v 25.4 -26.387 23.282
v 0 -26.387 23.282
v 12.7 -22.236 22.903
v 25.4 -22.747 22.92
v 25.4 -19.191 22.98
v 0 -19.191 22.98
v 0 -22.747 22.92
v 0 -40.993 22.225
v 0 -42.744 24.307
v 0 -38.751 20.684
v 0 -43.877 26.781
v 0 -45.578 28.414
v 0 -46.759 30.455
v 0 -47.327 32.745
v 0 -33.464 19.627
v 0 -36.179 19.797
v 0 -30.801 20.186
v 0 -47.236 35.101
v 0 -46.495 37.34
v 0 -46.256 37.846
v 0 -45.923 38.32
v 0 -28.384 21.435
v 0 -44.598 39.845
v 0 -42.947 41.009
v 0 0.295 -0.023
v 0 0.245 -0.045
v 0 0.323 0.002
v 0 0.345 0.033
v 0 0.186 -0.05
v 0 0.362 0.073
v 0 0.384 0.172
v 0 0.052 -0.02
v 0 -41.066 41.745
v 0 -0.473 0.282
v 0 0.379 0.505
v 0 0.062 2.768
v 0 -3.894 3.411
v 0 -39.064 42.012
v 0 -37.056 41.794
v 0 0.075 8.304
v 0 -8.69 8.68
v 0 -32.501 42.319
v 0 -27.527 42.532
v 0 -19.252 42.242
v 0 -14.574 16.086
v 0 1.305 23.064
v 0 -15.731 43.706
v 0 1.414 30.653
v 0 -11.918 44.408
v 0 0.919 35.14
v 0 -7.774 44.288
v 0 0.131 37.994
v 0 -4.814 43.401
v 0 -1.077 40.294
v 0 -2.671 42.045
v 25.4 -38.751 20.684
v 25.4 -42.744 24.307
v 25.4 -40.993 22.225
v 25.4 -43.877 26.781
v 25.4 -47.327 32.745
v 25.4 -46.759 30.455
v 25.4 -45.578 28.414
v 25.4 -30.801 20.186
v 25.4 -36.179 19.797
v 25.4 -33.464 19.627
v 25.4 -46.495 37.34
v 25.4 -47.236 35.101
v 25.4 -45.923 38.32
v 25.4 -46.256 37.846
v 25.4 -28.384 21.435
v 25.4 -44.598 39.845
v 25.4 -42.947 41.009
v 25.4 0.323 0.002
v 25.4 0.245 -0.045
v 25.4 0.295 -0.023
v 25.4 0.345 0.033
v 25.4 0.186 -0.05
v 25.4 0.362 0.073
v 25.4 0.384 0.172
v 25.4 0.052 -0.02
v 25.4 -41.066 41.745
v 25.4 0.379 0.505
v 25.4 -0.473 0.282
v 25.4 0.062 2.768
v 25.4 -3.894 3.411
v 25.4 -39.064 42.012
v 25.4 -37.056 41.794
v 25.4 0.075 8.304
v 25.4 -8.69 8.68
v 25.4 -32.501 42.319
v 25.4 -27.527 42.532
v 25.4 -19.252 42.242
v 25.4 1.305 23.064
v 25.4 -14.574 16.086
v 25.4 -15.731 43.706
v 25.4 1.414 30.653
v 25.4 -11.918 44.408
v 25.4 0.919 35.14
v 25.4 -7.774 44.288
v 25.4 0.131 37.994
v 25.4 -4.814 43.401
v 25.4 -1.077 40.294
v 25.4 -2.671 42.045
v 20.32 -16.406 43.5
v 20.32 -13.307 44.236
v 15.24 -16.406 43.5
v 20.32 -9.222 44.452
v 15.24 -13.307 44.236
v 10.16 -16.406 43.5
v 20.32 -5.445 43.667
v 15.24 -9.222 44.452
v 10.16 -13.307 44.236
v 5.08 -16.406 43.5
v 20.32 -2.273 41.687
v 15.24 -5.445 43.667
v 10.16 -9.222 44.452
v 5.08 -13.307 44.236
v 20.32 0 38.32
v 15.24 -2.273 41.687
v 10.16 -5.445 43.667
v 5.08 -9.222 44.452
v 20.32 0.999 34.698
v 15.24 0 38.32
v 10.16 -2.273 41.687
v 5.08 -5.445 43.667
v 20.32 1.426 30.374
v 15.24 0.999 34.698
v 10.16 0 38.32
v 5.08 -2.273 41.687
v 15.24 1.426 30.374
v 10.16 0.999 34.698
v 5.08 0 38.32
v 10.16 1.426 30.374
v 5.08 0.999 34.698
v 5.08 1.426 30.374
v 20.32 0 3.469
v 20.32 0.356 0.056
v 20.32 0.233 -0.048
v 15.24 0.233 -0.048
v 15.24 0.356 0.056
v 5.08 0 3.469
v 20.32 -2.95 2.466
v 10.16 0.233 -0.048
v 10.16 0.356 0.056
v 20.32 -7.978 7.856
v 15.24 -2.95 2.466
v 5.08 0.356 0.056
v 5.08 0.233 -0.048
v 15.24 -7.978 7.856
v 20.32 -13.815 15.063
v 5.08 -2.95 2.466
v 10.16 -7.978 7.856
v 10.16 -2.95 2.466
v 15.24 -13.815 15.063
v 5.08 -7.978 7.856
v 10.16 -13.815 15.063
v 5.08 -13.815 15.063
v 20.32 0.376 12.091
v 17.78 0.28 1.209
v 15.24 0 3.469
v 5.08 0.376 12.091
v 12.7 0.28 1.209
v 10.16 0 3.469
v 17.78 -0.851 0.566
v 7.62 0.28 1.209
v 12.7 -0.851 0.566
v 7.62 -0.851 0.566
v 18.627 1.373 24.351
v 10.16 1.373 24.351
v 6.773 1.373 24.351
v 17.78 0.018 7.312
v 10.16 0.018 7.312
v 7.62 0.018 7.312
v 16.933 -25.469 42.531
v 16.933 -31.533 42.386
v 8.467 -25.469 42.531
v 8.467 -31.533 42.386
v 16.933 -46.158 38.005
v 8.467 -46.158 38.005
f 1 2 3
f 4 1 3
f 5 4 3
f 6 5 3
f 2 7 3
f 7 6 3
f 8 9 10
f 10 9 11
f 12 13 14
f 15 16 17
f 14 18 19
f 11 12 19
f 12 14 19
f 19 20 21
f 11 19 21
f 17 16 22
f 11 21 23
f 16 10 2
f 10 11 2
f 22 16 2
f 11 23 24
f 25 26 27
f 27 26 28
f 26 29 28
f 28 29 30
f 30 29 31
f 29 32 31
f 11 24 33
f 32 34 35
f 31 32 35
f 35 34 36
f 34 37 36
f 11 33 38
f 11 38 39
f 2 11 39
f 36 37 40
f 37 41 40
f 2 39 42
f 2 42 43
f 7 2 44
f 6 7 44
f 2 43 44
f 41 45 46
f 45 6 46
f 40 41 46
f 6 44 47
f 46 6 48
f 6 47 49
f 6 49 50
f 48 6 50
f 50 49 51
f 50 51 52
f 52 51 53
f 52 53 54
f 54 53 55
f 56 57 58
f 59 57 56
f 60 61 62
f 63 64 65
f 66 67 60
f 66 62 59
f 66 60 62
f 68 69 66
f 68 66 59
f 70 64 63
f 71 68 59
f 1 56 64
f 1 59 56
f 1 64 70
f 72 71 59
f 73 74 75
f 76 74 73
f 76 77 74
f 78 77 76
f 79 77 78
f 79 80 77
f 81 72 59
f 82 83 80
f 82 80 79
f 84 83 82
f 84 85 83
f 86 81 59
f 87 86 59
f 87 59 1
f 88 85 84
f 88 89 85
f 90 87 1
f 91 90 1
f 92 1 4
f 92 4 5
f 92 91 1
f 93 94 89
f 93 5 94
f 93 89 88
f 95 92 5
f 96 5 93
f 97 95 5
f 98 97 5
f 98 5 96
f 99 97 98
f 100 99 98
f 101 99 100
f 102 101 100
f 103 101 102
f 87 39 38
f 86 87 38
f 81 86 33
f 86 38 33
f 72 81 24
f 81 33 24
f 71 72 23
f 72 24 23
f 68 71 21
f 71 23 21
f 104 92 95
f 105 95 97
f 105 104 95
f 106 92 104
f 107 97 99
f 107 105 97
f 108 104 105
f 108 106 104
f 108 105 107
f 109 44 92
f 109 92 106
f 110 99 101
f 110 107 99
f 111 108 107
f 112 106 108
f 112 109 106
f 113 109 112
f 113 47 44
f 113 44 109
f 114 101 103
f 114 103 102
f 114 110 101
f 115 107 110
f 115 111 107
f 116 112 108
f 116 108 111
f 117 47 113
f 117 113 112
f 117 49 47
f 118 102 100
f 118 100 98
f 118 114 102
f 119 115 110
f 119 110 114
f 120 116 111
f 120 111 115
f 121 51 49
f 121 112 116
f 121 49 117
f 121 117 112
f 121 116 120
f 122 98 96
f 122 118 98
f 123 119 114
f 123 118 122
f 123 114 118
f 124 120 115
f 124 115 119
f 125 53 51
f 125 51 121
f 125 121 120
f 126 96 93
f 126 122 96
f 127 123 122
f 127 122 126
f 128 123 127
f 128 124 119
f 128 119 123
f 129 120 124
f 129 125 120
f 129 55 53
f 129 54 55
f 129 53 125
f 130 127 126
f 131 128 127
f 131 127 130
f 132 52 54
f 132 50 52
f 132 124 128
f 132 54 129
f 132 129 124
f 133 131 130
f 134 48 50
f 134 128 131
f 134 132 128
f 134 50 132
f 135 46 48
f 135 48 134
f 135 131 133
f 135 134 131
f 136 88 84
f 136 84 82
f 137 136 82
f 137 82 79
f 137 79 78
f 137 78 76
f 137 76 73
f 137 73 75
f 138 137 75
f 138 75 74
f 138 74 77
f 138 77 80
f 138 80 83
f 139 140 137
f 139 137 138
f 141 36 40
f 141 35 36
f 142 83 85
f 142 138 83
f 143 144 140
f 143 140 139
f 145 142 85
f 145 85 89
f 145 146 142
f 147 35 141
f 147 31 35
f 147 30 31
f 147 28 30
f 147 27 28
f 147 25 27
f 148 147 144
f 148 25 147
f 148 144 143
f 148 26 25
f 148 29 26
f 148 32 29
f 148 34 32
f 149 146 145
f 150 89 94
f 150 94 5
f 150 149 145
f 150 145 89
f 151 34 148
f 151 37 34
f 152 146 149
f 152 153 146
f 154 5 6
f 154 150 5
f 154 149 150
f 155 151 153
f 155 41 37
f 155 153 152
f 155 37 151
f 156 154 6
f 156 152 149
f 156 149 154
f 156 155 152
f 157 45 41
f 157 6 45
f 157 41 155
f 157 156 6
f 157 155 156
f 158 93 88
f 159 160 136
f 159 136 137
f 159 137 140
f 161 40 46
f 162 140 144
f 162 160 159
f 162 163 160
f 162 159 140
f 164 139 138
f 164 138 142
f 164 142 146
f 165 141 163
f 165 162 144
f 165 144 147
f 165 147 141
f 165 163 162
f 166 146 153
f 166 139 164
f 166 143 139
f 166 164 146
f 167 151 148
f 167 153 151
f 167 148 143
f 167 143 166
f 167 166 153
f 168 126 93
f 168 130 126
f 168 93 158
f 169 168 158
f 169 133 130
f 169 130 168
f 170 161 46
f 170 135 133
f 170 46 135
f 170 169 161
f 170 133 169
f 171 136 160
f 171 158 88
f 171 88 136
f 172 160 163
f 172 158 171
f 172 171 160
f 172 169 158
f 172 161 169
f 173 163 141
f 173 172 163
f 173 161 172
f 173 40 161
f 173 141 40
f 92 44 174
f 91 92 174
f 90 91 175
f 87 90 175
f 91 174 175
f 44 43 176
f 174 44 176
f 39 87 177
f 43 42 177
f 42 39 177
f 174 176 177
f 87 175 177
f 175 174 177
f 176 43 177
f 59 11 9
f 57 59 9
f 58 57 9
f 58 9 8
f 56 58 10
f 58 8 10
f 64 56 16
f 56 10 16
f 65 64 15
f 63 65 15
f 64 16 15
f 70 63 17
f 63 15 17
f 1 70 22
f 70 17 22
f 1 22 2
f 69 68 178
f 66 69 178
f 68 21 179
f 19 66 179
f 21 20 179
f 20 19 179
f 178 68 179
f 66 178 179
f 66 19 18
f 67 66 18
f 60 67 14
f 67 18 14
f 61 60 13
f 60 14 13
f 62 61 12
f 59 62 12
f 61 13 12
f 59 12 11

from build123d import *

# Parameters (mm, degrees)
F1_DEPTH = 25.4


with BuildPart() as f1:
    # F0 (on Right) → F1 (new body)
    with BuildSketch(Plane.YZ):
        with BuildLine():
            add(Edge.make_bspline(
                [(-19.2516709124, 42.2422844533), (-25.4180651929, 42.7428924713), (-31.9312076278, 42.6146347321), (-37.0557698194, 41.7939585518)],
                knots=[0.779023836, 0.779023836, 0.779023836, 0.779023836, 0.900186151, 0.900186151, 0.900186151, 0.900186151], degree=3))
            add(Edge.make_bspline(
                [(-37.0557698194, 41.7939585518), (-41.2773982782, 41.1178832523), (-44.5566653921, 39.9718974982), (-45.9233932197, 38.3204706013)],
                knots=[0.900186151, 0.900186151, 0.900186151, 0.900186151, 1, 1, 1, 1], degree=3))
            ThreePointArc((-45.9233932197, 38.3204706013), (-46.2257538217, 37.8400514526), (-46.4950140005, 37.3403280809))
            add(Edge.make_bspline(
                [(-46.4950140005, 37.3403280809), (-47.125304192, 35.6266298388), (-46.1714074928, 33.5474887118), (-44.1539502727, 31.5068887672)],
                knots=[0.0187354852, 0.0187354852, 0.0187354852, 0.0187354852, 0.1125127868, 0.1125127868, 0.1125127868, 0.1125127868], degree=3))
            add(Edge.make_bspline(
                [(-44.1539502727, 31.5068887672), (-40.5919165932, 27.9039941648), (-33.7143787143, 24.4212464176), (-26.3868815692, 23.282187328)],
                knots=[0.1125127868, 0.1125127868, 0.1125127868, 0.1125127868, 0.2780865116, 0.2780865116, 0.2780865116, 0.2780865116], degree=3))
            add(Edge.make_bspline(
                [(-26.3868815692, 23.282187328), (-25.0127574411, 23.0685797963), (-22.6012399006, 22.8409760307), (-20.1989760382, 22.9056116045), (-19.1905778042, 22.9799334775)],
                knots=[0.2780865116, 0.2780865116, 0.2780865116, 0.2780865116, 0.3091365203, 0.3319573316, 0.3319573316, 0.3319573316, 0.3319573316], degree=3))
            add(Edge.make_bspline(
                [(-19.1905777925, 22.9799334911), (-21.5058229138, 26.8552819506), (-23.1967976321, 30.5877078512), (-23.5898643732, 33.5901193321)],
                knots=[0.9211133647, 0.9211133647, 0.9211133647, 0.9211133647, 1, 1, 1, 1], degree=3))
            add(Edge.make_bspline(
                [(-23.5898643732, 33.5901193321), (-24.1376398763, 37.7742623468), (-22.1647423287, 40.5406409998), (-19.2516709091, 42.2422844406)],
                knots=[0, 0, 0, 0, 0.1099359518, 0.1099359518, 0.1099359518, 0.1099359518], degree=3))
        make_face()
        with BuildLine():
            add(Edge.make_bspline(
                [(-37.0557698194, 41.7939585518), (-41.2773982782, 41.1178832523), (-44.5566653921, 39.9718974982), (-45.9233932197, 38.3204706013)],
                knots=[0.900186151, 0.900186151, 0.900186151, 0.900186151, 1, 1, 1, 1], degree=3))
            ThreePointArc((-37.0557698194, 41.7939585518), (-42.0286934036, 41.4335375195), (-45.9233932197, 38.3204706013))
        make_face()
        with BuildLine():
            ThreePointArc((-46.4950140005, 37.3403280809), (-46.2257538217, 37.8400514526), (-45.9233932197, 38.3204706013))
            add(Edge.make_bspline(
                [(-45.9233932197, 38.3204706013), (-46.179933863, 38.0104907283), (-46.3690902174, 37.6827027023), (-46.4950140005, 37.3403280809)],
                knots=[0, 0, 0, 0, 0.0187354852, 0.0187354852, 0.0187354852, 0.0187354852], degree=3))
        make_face()
        with BuildLine():
            add(Edge.make_bspline(
                [(-19.2516709091, 42.2422844406), (-17.4961367608, 43.2677633039), (-9.8677267463, 45.5915683384), (6.1925129739, 41.8340525506), (-1.8104152929, 5.3447987534), (2.355934836, -3.7635650252), (-12.8947889291, 12.4417941606), (-19.1905777925, 22.9799334911)],
                knots=[0.1099359518, 0.1099359518, 0.1099359518, 0.1099359518, 0.1761877836, 0.3509471381, 0.6213037996, 0.7065988862, 0.9211133647, 0.9211133647, 0.9211133647, 0.9211133647], degree=3))
            add(Edge.make_bspline(
                [(-19.1905778042, 22.9799334775), (-7.0912482036, 23.8716891432), (10.4890257051, 36.3613867908), (-10.4343655651, 41.5264668209), (-19.2516709124, 42.2422844533)],
                knots=[0.3319573316, 0.3319573316, 0.3319573316, 0.3319573316, 0.6057742709, 0.779023836, 0.779023836, 0.779023836, 0.779023836], degree=3))
        make_face()
        with BuildLine():
            add(Edge.make_bspline(
                [(-19.1905778042, 22.9799334775), (-7.0912482036, 23.8716891432), (10.4890257051, 36.3613867908), (-10.4343655651, 41.5264668209), (-19.2516709124, 42.2422844533)],
                knots=[0.3319573316, 0.3319573316, 0.3319573316, 0.3319573316, 0.6057742709, 0.779023836, 0.779023836, 0.779023836, 0.779023836], degree=3))
            add(Edge.make_bspline(
                [(-23.5898643732, 33.5901193321), (-24.1376398763, 37.7742623468), (-22.1647423287, 40.5406409998), (-19.2516709091, 42.2422844406)],
                knots=[0, 0, 0, 0, 0.1099359518, 0.1099359518, 0.1099359518, 0.1099359518], degree=3))
            add(Edge.make_bspline(
                [(-19.1905777925, 22.9799334911), (-21.5058229138, 26.8552819506), (-23.1967976321, 30.5877078512), (-23.5898643732, 33.5901193321)],
                knots=[0.9211133647, 0.9211133647, 0.9211133647, 0.9211133647, 1, 1, 1, 1], degree=3))
        make_face()
        with BuildLine():
            add(Edge.make_bspline(
                [(-46.4950140005, 37.3403280809), (-47.125304192, 35.6266298388), (-46.1714074928, 33.5474887118), (-44.1539502727, 31.5068887672)],
                knots=[0.0187354852, 0.0187354852, 0.0187354852, 0.0187354852, 0.1125127868, 0.1125127868, 0.1125127868, 0.1125127868], degree=3))
            ThreePointArc((-46.4950140005, 37.3403280809), (-47.1237278582, 31.580027774), (-43.8769457932, 26.7805749966))
            ThreePointArc((-43.8769457932, 26.7805749966), (-44.2957560659, 29.127303311), (-44.1539502727, 31.5068887672))
        make_face()
        with BuildLine():
            add(Edge.make_bspline(
                [(-44.1539502727, 31.5068887672), (-40.5919165932, 27.9039941648), (-33.7143787143, 24.4212464176), (-26.3868815692, 23.282187328)],
                knots=[0.1125127868, 0.1125127868, 0.1125127868, 0.1125127868, 0.2780865116, 0.2780865116, 0.2780865116, 0.2780865116], degree=3))
            ThreePointArc((-44.1539502727, 31.5068887672), (-44.2957560659, 29.127303311), (-43.8769457932, 26.7805749966))
            ThreePointArc((-43.8769457932, 26.7805749966), (-36.1788987701, 19.7970165972), (-26.3868815692, 23.282187328))
        make_face()
    extrude(amount=F1_DEPTH)


solid = f1.part
